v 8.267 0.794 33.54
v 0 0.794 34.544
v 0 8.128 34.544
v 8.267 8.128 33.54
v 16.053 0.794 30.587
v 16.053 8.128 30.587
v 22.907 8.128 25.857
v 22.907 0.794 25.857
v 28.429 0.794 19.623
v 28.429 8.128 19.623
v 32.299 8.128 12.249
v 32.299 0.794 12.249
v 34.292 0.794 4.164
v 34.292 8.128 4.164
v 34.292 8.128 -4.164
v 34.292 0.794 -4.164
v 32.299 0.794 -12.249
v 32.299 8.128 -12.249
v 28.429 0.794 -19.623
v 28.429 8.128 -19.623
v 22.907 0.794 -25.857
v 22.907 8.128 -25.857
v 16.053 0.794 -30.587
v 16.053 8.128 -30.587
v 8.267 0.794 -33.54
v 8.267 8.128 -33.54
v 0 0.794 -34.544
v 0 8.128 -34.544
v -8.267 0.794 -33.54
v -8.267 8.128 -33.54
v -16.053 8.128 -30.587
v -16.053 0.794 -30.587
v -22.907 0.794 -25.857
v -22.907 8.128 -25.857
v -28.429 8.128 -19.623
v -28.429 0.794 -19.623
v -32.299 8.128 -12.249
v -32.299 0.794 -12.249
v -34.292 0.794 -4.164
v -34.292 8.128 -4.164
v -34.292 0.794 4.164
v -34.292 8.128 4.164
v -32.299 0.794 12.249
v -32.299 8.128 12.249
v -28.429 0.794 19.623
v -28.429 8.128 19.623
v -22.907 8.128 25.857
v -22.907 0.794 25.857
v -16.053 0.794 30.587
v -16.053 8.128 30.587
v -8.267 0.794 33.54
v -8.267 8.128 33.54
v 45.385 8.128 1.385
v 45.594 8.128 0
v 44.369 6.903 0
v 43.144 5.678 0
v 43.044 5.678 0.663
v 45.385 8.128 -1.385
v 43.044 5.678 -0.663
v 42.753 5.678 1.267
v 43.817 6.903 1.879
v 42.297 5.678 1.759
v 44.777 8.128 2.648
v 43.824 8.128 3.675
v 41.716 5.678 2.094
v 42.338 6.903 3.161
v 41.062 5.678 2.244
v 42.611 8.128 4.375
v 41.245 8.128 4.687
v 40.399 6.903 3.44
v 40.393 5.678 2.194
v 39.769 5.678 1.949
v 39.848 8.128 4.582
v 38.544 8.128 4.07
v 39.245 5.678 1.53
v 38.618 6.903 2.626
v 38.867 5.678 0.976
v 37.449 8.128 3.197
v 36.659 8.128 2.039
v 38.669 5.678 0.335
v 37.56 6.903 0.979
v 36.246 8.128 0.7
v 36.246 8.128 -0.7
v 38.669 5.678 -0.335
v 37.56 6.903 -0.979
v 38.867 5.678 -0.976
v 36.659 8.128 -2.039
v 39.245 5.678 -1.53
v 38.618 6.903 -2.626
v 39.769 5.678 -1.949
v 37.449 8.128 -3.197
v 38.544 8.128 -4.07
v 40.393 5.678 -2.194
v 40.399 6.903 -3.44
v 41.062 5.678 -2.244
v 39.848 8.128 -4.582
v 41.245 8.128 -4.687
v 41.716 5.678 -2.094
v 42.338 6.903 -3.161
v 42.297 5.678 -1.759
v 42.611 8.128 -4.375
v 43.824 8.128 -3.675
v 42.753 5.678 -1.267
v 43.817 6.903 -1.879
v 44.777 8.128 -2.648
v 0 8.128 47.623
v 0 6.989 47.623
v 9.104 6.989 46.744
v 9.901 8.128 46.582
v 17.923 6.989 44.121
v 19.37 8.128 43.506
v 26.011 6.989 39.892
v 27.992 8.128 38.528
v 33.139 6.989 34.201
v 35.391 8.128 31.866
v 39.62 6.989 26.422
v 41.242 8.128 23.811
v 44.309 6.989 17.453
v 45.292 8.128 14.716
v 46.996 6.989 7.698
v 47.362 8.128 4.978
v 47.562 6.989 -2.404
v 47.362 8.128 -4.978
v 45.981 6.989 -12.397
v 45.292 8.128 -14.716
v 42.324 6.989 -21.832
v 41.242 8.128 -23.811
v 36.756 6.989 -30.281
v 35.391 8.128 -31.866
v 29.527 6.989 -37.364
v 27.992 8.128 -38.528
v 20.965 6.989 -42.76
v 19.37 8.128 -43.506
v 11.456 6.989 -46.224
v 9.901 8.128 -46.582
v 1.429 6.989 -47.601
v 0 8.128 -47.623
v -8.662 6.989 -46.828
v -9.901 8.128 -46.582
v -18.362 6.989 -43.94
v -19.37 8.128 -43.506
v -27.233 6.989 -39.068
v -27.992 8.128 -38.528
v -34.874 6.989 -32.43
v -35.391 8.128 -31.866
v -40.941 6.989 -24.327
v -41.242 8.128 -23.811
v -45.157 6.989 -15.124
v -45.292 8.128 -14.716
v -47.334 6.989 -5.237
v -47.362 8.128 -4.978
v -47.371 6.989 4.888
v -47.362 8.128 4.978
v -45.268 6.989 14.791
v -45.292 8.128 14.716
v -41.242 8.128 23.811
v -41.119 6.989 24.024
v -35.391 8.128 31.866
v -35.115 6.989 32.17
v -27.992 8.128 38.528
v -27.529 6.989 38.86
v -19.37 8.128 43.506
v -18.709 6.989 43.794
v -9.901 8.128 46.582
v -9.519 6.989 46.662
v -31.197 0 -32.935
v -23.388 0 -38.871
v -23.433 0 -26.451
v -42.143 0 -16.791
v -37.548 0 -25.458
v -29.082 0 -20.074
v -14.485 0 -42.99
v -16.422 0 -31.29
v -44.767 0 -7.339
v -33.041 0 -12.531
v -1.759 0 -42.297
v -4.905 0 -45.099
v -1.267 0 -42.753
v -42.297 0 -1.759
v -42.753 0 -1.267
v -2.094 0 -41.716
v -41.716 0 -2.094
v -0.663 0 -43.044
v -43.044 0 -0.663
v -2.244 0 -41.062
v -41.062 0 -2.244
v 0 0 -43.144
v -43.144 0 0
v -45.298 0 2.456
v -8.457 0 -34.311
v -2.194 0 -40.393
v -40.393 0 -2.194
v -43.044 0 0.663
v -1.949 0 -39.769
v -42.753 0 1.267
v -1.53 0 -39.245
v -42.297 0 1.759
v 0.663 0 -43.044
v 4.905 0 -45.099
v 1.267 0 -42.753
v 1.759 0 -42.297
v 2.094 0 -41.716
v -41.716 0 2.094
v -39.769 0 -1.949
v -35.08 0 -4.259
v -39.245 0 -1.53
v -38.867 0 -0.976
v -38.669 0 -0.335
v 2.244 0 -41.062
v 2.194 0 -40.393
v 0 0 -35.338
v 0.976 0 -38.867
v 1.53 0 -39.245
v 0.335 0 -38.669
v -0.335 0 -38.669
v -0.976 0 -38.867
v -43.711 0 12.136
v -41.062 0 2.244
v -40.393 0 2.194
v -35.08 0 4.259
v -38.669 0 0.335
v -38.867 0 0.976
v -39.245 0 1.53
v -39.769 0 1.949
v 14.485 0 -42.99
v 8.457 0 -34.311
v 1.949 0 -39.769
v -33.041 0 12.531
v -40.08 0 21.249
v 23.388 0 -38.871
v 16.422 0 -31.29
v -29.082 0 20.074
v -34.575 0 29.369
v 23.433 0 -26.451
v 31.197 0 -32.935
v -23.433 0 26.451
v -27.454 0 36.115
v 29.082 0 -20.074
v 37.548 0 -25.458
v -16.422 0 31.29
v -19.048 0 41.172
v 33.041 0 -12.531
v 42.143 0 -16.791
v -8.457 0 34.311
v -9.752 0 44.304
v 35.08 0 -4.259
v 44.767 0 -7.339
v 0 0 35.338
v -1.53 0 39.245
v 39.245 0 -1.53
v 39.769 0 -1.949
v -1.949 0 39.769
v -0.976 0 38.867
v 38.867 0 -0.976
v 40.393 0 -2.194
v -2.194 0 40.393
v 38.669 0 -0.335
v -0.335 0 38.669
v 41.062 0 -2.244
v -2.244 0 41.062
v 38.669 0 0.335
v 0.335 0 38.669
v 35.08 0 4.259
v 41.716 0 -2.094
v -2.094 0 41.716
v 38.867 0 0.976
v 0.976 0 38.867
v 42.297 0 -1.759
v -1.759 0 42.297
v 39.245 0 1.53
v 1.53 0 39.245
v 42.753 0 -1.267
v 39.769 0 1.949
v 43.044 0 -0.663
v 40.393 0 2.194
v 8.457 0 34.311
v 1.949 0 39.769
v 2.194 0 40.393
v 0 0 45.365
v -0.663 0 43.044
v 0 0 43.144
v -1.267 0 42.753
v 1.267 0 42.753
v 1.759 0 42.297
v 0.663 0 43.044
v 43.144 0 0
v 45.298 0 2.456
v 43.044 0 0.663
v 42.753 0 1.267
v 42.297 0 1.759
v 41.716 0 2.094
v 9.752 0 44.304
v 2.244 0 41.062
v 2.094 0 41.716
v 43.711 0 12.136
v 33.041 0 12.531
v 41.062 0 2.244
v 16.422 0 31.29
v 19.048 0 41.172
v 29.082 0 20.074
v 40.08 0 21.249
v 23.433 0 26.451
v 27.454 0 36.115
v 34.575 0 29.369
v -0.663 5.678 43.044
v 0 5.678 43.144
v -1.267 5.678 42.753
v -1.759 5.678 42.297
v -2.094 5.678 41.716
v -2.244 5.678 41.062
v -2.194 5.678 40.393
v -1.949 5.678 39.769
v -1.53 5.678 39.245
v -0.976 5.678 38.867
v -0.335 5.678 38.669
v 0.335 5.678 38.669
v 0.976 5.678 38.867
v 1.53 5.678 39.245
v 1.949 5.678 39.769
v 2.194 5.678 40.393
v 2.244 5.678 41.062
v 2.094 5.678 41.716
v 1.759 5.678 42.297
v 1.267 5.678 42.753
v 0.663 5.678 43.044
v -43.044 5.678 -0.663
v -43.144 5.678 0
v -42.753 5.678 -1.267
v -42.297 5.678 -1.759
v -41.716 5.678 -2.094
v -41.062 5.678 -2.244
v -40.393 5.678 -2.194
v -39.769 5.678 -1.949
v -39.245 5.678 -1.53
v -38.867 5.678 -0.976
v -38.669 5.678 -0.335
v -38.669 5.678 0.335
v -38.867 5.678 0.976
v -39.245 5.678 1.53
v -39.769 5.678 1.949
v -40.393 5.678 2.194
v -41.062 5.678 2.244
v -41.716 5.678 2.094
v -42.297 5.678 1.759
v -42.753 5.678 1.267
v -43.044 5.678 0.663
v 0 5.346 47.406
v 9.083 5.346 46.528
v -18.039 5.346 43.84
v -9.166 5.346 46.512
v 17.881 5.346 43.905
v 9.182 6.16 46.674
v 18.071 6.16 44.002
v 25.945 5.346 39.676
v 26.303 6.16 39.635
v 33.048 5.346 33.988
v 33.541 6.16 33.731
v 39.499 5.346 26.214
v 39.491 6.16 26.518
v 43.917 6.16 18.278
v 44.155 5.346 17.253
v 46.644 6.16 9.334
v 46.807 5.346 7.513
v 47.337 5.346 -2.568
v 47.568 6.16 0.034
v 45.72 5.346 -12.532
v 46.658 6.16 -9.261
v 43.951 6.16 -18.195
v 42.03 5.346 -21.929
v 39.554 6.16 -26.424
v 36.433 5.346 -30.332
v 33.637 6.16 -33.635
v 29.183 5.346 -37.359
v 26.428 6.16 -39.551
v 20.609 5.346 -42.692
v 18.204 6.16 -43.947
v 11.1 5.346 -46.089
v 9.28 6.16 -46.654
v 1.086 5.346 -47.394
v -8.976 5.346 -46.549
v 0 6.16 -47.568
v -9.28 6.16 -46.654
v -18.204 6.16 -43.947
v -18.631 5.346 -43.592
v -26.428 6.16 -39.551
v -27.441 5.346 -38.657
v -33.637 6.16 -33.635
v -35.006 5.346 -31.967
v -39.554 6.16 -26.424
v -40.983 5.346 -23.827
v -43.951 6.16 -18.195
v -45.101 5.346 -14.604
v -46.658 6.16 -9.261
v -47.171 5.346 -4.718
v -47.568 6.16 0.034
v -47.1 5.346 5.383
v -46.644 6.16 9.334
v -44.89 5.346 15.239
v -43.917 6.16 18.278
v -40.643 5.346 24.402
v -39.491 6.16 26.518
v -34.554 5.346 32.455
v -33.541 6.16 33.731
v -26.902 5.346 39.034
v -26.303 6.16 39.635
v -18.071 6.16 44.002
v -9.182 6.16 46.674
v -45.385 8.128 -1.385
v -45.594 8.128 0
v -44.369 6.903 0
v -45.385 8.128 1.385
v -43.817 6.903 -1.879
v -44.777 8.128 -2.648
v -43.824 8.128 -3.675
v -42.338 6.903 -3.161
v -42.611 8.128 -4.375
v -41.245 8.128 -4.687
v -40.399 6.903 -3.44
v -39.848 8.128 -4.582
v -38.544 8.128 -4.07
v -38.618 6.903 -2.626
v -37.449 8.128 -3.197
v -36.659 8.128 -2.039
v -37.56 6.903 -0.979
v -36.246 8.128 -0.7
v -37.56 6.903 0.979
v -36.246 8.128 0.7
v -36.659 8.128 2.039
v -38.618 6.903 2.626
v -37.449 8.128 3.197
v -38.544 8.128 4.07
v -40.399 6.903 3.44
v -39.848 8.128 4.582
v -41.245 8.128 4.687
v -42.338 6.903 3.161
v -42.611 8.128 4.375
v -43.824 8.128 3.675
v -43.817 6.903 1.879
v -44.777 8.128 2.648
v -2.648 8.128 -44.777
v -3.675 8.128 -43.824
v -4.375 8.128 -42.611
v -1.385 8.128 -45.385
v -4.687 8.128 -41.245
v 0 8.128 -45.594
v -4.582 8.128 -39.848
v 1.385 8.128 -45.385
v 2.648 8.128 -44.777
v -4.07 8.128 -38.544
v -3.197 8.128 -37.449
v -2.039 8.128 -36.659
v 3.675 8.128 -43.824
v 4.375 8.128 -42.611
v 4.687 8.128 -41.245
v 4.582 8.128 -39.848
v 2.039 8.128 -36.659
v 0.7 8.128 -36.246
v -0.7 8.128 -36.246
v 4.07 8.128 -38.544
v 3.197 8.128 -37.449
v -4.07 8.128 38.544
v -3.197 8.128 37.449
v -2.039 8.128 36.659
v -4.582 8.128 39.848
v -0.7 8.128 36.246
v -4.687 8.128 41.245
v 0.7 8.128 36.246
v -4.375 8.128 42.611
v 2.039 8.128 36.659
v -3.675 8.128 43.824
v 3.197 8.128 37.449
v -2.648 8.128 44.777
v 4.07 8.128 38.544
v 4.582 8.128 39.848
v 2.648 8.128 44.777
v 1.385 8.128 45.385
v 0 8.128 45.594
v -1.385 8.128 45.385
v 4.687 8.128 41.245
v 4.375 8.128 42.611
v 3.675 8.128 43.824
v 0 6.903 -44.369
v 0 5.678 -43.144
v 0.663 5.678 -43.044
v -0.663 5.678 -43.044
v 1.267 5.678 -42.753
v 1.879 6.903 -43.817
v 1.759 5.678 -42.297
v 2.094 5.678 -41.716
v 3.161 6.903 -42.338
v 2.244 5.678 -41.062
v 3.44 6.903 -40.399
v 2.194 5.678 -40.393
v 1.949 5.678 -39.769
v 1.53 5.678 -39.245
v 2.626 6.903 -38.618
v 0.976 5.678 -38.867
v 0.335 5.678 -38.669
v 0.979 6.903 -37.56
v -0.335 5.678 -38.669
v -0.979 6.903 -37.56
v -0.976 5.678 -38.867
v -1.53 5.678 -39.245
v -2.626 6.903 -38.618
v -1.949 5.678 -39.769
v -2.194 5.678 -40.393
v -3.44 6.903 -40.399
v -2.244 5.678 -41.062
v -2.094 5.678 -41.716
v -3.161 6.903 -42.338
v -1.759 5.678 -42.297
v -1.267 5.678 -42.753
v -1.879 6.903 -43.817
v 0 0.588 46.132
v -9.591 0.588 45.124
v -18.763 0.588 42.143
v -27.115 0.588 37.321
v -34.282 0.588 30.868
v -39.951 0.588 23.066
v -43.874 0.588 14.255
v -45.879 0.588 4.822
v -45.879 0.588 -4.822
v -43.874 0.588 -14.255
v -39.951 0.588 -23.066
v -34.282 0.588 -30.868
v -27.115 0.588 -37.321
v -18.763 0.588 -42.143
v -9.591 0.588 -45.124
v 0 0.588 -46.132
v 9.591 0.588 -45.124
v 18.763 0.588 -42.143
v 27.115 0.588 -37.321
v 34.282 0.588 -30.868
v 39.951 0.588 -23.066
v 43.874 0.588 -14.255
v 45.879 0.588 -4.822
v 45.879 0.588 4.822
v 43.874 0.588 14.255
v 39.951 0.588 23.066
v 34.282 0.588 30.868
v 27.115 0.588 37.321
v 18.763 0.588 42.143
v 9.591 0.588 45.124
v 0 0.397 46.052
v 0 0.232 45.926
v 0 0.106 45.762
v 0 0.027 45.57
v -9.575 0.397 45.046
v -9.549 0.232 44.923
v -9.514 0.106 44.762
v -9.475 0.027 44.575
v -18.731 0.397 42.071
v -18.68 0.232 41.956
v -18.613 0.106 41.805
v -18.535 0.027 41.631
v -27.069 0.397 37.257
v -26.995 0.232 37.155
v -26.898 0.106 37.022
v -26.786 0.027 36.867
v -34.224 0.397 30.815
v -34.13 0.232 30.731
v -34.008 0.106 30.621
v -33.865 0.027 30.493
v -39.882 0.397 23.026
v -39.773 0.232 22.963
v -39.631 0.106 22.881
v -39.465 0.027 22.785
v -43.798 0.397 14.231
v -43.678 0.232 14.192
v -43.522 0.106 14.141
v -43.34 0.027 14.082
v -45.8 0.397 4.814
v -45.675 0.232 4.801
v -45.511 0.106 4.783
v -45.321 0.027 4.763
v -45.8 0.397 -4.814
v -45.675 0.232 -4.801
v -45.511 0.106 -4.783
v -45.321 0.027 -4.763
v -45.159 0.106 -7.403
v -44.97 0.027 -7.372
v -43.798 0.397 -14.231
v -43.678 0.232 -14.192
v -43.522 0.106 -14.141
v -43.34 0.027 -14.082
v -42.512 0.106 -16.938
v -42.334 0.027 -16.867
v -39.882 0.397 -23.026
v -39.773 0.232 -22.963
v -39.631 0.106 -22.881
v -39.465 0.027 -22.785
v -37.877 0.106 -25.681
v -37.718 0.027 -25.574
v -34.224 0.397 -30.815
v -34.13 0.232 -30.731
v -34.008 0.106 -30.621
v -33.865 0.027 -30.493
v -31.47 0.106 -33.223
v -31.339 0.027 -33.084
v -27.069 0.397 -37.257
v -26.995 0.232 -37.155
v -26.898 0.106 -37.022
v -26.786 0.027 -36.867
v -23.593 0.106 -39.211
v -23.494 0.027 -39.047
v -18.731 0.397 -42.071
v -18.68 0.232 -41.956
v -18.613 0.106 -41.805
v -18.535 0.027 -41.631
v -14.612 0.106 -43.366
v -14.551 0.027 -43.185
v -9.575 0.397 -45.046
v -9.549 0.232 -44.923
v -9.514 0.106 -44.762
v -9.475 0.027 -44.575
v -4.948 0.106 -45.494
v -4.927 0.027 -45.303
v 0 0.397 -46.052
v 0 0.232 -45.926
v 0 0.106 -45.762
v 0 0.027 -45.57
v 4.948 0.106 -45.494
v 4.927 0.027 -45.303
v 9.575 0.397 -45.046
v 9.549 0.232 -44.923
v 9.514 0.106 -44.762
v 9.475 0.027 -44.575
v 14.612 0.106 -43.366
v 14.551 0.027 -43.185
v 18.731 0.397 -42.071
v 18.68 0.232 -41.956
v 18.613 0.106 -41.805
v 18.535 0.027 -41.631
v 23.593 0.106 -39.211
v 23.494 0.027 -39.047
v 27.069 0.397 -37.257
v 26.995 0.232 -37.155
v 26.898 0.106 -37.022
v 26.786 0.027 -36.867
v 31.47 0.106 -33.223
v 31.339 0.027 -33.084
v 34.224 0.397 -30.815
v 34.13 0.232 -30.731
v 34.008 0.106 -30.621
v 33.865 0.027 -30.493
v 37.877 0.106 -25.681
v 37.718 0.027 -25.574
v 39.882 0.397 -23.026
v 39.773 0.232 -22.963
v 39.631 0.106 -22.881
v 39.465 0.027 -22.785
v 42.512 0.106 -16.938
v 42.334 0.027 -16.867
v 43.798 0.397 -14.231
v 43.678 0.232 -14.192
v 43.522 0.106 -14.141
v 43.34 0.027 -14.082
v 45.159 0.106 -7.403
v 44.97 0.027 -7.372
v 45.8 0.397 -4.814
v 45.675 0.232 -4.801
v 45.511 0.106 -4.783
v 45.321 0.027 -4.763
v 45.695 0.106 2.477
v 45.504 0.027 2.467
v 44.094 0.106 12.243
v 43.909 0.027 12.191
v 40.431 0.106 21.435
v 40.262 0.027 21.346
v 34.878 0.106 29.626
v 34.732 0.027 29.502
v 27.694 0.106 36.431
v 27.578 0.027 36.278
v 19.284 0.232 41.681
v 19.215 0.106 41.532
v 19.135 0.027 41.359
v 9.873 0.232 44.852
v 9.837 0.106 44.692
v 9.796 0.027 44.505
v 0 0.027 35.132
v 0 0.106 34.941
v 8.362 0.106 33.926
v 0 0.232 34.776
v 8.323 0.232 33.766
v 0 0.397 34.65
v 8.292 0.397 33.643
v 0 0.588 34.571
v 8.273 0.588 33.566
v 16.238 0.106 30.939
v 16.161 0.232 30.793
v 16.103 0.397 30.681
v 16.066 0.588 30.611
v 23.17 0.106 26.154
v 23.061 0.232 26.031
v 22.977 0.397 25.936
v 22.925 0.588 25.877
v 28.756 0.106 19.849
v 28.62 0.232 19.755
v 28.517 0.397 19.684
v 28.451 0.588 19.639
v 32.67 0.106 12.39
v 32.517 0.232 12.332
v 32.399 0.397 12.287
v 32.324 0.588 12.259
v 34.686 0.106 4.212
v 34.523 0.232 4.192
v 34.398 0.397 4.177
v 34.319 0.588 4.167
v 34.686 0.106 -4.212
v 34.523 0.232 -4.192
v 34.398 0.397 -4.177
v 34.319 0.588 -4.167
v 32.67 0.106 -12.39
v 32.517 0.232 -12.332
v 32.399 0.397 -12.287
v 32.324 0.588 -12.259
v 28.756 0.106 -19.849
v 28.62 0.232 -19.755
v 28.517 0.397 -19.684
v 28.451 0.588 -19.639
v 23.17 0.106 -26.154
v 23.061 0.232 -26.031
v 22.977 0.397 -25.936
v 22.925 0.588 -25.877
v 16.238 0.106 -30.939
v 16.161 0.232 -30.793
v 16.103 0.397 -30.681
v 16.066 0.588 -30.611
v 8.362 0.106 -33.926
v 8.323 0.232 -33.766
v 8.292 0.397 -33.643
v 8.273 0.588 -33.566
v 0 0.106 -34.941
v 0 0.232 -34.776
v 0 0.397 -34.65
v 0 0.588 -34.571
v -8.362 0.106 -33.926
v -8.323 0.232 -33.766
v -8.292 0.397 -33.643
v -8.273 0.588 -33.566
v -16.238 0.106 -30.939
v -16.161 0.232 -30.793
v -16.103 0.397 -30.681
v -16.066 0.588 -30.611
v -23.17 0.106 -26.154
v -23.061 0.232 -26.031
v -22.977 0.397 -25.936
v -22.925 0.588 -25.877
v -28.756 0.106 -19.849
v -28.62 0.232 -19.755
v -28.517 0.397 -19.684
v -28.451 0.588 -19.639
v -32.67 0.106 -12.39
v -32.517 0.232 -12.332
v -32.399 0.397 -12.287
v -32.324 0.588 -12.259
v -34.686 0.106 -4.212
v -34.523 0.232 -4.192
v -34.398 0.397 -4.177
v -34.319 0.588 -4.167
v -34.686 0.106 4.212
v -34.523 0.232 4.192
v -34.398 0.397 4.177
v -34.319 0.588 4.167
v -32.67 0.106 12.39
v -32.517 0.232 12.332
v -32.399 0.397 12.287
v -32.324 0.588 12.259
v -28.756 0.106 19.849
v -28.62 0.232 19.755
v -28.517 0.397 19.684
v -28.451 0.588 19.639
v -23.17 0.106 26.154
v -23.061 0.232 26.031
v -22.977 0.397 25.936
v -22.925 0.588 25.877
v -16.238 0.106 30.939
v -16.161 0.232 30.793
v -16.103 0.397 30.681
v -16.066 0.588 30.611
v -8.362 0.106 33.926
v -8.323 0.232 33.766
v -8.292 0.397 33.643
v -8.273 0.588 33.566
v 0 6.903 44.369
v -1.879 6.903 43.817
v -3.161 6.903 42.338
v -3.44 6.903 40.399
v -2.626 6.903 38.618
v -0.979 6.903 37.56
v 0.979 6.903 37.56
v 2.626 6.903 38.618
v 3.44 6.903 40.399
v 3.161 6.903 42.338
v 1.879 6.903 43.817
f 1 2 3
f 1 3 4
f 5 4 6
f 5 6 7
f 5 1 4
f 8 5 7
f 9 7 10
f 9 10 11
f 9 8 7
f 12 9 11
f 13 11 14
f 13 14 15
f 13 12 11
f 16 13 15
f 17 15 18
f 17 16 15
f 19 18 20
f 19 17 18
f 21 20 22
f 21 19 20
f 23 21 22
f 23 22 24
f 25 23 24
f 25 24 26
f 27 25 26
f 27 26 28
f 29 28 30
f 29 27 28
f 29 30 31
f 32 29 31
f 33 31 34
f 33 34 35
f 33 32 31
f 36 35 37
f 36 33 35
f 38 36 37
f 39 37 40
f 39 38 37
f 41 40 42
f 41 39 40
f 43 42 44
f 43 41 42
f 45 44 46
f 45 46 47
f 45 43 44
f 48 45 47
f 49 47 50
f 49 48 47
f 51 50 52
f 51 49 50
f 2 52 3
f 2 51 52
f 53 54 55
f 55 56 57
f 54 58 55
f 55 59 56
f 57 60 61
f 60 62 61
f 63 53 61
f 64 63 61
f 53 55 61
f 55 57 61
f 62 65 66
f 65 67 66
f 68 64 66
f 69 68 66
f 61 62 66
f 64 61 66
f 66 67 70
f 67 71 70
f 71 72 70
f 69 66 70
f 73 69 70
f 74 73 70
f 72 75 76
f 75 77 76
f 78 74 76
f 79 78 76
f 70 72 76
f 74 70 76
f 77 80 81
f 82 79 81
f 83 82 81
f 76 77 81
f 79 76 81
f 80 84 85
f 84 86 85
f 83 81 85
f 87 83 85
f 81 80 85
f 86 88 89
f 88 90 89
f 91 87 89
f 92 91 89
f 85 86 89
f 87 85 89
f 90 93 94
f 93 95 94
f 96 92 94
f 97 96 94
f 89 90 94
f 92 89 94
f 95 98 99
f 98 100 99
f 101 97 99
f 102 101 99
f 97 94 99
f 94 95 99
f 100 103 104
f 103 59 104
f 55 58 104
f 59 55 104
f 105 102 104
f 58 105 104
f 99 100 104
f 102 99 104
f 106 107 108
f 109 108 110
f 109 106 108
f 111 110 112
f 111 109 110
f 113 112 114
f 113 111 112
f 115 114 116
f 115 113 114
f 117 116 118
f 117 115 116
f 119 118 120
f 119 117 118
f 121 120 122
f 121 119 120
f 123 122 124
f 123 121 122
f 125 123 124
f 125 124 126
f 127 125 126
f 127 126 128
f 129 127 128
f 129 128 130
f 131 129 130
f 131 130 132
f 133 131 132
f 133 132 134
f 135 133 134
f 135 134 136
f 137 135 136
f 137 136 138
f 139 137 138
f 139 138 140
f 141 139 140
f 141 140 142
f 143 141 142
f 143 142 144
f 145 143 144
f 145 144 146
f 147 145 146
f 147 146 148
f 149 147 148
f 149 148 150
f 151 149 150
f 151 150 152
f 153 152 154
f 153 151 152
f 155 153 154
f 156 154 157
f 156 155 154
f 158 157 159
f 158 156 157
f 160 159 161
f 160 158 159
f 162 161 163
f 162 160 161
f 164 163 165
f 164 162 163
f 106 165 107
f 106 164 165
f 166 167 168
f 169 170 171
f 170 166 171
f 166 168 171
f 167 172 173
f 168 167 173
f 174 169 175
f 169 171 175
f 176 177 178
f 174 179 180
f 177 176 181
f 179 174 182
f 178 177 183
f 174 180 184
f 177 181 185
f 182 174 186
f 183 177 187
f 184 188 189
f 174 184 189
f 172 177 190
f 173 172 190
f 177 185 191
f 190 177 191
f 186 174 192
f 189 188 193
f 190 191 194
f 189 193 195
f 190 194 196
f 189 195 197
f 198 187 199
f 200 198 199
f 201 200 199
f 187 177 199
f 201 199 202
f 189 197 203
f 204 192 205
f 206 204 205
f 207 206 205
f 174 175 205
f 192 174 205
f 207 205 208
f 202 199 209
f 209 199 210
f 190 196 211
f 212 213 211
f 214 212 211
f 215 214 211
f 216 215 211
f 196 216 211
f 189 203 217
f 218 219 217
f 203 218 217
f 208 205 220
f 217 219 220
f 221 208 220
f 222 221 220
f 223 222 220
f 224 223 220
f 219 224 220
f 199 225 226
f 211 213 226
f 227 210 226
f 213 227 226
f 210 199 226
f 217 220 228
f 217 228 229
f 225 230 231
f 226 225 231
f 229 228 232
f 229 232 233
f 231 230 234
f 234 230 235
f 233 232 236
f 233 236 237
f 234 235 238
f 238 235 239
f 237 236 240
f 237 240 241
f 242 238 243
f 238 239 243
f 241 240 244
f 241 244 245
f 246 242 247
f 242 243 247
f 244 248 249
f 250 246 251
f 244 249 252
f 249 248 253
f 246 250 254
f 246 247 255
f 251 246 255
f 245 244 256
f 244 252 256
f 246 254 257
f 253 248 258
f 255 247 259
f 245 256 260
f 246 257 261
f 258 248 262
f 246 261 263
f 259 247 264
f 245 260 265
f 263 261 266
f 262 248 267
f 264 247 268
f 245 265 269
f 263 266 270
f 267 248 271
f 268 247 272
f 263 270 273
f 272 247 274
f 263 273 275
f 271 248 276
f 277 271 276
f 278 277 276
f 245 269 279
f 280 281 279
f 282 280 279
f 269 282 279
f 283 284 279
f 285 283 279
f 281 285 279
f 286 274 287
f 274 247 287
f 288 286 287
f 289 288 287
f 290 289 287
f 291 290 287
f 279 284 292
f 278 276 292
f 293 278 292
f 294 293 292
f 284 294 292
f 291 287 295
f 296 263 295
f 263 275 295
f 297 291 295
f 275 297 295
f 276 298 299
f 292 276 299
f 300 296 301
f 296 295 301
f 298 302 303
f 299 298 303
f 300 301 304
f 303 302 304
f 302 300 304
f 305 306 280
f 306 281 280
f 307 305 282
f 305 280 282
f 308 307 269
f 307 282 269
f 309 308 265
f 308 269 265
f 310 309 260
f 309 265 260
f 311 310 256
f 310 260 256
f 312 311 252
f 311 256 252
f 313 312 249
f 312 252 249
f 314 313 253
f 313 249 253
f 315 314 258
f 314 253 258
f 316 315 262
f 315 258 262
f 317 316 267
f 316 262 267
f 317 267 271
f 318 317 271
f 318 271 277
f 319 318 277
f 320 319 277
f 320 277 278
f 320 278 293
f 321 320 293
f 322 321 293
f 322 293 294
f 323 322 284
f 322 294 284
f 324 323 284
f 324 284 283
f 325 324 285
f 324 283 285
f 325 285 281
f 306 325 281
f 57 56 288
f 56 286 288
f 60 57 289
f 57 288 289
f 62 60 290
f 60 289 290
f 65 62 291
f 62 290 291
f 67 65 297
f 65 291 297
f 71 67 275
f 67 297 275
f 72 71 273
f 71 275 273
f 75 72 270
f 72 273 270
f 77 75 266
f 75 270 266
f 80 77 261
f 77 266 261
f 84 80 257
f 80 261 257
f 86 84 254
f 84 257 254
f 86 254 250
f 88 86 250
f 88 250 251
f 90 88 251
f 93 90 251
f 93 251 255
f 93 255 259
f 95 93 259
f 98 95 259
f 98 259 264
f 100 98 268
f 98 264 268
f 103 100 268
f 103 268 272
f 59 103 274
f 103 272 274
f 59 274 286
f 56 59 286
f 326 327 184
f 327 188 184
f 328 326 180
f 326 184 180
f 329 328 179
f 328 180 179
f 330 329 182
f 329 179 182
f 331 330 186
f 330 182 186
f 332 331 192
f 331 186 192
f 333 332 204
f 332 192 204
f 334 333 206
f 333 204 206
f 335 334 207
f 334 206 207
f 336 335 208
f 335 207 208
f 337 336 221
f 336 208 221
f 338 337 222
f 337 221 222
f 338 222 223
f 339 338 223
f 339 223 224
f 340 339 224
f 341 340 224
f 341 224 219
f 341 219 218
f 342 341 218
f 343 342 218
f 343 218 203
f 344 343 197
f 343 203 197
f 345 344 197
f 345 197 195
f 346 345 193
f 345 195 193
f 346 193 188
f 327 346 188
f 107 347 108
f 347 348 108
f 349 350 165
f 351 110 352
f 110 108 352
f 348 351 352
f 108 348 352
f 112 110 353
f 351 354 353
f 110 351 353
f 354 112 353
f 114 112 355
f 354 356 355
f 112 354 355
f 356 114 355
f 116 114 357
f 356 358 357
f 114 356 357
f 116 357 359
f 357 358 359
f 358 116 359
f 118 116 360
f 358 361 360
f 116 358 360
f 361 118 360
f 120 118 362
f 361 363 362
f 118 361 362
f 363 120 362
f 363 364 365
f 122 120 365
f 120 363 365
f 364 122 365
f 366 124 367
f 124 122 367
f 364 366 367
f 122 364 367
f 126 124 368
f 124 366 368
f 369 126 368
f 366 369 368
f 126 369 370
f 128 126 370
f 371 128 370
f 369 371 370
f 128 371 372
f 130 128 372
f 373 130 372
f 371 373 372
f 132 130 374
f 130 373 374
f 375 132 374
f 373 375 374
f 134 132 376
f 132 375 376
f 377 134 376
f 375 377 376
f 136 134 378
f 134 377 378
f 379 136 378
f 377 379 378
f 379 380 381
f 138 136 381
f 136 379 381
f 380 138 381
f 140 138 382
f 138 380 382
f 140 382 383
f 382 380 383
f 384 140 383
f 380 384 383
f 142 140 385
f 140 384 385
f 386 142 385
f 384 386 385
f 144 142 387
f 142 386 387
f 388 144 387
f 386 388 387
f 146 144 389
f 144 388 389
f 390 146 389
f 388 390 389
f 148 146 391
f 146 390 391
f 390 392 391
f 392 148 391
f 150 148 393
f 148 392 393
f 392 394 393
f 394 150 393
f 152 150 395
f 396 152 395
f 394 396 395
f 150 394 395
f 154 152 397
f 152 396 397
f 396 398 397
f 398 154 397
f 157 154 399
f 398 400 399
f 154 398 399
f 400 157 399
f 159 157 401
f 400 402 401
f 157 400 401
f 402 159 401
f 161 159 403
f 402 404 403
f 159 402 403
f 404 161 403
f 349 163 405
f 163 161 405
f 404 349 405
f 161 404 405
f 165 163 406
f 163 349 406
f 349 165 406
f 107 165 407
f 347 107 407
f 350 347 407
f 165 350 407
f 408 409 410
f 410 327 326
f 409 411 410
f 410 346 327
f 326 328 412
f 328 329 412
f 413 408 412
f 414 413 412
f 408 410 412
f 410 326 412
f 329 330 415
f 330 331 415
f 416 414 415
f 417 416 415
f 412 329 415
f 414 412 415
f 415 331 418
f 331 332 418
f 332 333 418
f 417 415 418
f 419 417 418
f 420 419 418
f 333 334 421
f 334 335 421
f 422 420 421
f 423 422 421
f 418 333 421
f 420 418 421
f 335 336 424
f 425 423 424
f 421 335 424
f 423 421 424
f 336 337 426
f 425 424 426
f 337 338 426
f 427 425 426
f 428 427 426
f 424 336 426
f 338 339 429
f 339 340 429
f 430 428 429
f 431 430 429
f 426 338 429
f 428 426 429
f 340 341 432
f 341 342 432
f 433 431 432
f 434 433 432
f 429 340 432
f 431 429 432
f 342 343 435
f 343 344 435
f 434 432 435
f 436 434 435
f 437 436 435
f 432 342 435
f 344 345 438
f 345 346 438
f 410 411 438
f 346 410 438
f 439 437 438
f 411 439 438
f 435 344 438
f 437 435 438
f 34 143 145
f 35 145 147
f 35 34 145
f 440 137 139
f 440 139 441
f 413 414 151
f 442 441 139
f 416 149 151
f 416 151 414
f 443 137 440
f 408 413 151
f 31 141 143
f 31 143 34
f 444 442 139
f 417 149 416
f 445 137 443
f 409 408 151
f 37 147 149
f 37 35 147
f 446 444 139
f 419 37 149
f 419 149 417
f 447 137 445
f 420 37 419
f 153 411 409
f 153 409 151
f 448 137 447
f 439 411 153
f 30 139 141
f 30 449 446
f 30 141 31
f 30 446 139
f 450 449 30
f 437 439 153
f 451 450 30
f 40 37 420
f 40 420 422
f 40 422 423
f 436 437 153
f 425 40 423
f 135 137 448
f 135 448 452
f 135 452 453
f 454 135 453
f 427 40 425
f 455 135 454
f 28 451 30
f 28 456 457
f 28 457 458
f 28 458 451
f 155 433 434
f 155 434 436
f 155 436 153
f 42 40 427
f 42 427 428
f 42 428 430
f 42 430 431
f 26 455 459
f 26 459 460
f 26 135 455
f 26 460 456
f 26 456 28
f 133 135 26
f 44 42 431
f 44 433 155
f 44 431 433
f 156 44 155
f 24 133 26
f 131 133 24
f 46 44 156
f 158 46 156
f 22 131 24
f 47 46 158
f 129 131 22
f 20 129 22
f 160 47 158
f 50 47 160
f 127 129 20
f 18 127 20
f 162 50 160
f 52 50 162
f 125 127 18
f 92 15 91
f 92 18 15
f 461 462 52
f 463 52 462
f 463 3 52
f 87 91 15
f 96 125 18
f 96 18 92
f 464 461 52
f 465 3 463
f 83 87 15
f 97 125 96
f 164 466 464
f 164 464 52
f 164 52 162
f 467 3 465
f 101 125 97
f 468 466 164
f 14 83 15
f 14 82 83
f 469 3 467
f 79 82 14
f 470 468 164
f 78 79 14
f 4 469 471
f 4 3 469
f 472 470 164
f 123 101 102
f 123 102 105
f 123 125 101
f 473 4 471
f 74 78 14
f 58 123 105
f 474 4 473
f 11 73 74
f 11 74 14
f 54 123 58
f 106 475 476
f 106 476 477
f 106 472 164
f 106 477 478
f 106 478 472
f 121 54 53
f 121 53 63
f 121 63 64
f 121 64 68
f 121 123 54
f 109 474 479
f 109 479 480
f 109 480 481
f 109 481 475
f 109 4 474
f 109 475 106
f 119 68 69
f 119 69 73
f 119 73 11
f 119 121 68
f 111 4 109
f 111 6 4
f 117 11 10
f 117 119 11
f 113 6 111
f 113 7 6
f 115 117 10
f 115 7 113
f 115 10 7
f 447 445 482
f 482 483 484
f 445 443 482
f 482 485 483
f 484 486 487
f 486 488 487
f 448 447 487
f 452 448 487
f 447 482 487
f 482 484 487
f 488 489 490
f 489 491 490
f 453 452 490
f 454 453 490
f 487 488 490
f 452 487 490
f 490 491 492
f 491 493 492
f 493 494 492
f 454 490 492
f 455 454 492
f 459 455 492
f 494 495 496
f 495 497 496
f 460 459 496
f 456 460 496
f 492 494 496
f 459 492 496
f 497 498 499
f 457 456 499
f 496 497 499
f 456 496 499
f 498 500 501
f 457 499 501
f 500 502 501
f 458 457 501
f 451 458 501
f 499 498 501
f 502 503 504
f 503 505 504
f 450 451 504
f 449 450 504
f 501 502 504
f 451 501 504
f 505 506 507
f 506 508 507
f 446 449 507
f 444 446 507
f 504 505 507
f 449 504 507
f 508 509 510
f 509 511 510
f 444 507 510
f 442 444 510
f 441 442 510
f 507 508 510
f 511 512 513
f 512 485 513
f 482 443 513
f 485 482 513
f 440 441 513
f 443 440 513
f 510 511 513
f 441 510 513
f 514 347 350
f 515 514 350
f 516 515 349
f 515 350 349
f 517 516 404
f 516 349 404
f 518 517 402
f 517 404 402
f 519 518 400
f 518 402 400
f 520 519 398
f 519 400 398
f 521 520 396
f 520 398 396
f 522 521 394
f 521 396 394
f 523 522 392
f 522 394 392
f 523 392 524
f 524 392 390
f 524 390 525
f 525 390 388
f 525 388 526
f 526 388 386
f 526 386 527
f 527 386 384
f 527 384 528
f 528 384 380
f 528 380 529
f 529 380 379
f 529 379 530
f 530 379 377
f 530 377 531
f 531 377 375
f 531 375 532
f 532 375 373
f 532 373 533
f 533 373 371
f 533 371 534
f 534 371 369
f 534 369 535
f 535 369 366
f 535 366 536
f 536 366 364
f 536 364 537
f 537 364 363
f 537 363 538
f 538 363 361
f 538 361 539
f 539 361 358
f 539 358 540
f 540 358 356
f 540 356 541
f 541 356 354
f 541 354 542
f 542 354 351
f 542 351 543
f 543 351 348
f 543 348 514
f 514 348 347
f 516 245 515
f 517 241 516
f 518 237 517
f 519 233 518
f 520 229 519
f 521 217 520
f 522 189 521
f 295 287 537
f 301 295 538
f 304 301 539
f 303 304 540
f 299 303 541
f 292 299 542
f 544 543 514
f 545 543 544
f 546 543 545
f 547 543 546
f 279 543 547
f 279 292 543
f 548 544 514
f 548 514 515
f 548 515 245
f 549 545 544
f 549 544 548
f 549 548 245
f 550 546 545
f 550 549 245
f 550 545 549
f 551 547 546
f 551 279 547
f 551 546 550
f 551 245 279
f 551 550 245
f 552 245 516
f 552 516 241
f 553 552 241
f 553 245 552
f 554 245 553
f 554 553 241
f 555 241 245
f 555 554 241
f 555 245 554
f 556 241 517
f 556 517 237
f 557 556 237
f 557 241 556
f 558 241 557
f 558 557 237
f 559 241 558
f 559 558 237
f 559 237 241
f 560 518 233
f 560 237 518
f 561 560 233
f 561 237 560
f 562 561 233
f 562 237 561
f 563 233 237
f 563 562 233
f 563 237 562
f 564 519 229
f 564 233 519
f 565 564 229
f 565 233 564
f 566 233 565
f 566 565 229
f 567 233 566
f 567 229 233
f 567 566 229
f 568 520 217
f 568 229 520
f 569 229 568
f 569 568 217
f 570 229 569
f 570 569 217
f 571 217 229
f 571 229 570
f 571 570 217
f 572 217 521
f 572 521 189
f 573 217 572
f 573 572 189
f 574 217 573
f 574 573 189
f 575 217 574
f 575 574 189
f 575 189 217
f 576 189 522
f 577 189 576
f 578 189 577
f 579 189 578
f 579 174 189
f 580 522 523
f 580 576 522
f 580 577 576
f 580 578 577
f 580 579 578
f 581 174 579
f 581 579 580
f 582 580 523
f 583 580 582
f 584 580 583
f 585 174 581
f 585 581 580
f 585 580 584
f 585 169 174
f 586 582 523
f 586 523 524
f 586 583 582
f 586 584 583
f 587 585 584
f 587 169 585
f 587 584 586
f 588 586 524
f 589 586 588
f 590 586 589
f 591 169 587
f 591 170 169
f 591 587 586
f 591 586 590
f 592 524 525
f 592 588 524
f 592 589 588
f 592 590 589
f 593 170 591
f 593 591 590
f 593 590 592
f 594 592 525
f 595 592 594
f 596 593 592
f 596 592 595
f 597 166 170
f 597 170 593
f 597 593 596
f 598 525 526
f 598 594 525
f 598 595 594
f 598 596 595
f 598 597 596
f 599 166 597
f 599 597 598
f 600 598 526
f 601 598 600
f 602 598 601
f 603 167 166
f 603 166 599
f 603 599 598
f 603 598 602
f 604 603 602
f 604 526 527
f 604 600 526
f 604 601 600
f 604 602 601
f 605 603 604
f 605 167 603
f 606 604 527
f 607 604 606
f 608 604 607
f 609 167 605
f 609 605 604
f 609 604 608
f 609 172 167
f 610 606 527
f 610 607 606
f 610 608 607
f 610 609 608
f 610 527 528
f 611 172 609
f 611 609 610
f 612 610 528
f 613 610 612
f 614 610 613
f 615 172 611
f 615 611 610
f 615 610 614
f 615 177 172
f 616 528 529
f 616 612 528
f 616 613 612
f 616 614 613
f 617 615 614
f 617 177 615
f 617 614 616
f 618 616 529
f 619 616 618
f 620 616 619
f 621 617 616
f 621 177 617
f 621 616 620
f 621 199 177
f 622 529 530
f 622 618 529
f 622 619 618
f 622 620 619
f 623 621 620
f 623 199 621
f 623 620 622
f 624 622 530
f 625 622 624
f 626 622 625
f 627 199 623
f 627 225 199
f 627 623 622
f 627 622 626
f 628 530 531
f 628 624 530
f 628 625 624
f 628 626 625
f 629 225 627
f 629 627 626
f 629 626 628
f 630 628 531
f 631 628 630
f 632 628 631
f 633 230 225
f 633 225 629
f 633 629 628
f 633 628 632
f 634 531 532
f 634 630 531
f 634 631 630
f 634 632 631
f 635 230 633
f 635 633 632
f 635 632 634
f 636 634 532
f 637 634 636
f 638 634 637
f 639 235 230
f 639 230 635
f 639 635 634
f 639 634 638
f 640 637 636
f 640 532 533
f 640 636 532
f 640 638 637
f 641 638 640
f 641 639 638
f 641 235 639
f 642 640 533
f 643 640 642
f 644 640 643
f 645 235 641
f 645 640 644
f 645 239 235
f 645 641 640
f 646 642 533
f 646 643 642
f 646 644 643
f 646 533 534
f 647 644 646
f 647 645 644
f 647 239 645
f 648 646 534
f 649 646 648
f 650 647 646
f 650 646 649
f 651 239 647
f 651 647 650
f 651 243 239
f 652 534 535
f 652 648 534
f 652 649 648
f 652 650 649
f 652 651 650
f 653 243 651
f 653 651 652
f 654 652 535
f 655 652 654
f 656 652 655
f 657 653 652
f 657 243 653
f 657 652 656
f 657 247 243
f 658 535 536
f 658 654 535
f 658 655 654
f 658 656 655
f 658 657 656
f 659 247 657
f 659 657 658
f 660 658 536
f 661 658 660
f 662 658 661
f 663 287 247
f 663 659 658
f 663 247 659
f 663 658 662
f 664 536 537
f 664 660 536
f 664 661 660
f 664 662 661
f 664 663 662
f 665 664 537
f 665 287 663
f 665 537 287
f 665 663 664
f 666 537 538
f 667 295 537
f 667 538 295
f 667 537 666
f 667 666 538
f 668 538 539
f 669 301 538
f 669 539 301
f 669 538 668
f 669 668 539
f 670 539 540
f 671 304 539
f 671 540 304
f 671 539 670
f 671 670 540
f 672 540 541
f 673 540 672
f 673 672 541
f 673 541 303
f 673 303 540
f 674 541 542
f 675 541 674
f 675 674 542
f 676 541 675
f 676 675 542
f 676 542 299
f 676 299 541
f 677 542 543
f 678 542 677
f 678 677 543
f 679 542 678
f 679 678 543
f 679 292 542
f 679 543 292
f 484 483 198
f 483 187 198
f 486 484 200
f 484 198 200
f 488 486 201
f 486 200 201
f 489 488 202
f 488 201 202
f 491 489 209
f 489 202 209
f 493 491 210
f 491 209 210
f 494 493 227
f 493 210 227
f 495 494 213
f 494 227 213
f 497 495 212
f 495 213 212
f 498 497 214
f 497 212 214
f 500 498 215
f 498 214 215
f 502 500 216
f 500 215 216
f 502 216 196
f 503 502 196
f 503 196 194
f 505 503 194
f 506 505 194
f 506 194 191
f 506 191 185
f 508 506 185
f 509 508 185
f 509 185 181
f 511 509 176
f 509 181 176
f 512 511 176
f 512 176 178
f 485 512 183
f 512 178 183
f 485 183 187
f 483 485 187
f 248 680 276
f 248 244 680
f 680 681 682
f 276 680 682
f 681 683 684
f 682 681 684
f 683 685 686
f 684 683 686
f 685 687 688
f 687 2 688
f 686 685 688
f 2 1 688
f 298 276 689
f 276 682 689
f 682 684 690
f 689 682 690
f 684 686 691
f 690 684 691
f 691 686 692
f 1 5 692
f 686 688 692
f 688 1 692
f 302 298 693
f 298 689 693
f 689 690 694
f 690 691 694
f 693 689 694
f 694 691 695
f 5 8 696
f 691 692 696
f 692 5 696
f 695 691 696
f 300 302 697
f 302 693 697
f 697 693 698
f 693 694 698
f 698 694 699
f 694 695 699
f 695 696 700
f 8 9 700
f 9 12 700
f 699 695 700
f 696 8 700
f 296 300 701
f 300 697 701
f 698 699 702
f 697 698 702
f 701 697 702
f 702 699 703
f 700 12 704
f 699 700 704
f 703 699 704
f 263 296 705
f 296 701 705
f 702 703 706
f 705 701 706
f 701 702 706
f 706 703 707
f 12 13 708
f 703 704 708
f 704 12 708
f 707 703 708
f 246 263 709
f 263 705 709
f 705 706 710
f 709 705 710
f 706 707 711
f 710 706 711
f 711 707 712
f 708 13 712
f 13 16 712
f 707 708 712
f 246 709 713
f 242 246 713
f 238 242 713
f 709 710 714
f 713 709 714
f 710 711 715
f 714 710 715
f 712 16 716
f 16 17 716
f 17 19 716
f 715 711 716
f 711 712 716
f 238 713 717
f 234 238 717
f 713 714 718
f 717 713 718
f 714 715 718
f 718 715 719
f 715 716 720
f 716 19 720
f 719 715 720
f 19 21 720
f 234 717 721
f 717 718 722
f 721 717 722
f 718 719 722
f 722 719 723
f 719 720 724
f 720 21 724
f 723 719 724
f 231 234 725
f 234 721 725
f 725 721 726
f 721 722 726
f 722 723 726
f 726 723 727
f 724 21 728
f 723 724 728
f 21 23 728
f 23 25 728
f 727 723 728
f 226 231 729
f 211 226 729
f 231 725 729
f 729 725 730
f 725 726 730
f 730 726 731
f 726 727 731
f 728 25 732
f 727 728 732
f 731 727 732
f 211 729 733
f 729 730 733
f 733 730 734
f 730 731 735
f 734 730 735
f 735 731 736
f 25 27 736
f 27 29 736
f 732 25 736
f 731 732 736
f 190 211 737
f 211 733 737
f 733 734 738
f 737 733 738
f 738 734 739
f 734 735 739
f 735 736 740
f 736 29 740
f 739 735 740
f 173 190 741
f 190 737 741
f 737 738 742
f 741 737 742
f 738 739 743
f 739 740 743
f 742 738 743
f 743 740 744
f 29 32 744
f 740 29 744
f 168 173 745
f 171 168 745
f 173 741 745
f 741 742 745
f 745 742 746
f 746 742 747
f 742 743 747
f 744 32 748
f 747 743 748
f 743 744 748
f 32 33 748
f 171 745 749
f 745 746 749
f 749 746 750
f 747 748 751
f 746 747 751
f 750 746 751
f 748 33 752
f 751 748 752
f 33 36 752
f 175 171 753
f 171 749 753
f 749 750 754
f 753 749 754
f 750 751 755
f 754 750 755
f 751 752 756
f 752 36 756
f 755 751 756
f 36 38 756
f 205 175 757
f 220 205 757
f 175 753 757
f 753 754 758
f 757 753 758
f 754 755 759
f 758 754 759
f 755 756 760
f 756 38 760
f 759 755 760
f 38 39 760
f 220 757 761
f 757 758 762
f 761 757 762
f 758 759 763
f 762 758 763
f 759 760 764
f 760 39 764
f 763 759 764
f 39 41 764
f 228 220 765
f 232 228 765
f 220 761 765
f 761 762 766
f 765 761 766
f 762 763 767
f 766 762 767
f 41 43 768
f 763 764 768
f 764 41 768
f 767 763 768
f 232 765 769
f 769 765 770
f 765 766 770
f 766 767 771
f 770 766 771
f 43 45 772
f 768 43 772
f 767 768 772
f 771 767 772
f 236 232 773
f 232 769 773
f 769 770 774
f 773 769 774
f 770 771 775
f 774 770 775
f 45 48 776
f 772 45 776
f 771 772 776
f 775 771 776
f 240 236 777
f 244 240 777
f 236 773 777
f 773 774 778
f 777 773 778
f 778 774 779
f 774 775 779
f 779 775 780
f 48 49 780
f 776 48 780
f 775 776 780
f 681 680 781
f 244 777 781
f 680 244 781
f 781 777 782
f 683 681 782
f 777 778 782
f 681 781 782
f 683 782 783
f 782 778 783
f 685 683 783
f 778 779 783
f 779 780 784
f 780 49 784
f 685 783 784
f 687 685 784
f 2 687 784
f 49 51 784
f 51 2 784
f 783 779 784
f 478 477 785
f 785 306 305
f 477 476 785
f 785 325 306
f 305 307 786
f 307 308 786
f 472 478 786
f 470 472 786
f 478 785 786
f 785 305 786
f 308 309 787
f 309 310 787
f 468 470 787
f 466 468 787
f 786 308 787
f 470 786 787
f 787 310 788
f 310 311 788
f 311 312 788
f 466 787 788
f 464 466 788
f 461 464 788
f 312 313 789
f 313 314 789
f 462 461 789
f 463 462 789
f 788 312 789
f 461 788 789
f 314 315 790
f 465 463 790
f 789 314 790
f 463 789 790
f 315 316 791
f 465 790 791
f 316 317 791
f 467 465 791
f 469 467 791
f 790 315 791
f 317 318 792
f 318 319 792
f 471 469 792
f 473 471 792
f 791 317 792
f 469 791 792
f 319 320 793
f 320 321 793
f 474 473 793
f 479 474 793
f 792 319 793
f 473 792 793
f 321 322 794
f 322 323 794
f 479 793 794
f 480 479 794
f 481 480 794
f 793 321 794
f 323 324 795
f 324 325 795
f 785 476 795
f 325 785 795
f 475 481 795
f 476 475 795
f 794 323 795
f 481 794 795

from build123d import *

# Parameters (mm, degrees)
SKETCH1_R                                       = 47.244
SKETCH1_R_2                                     = 34.544
BOSS_EXTRUDE1_DEPTH                             = 8.128
CSK_FOR_M4_FLAT_HEAD_MACHINE_SCREW1_D           = 4.5
CSK_FOR_M4_FLAT_HEAD_MACHINE_SCREW1_CSINK_D     = 9.4
CSK_FOR_M4_FLAT_HEAD_MACHINE_SCREW1_CSINK_ANGLE = 90
CIRPATTERN1_COUNT                               = 4
DRAFT2_ANGLE                                    = 15
SKETCH6_OUTSIDE_W                               = 125.592
SKETCH6_OUTSIDE_H                               = 125.592
SKETCH6_OUTSIDE_R                               = 47.622724369
CUT_EXTRUDE1_DEPTH                              = 69.580417064
FILLET1_R                                       = 6.35
FILLET2_R                                       = 0.79375


with BuildPart() as part:
    # Sketch1 → Boss-Extrude1 (new body)
    with BuildSketch(Plane(origin=(0, 0, 0), x_dir=(1, 0, 0), z_dir=(0, 1, 0))):
        with Locations(Location((0, 0, 0), (0, 0, 270))):
            Circle(SKETCH1_R)
        with Locations(Location((0, 0, 0), (0, 0, 270))):
            Circle(SKETCH1_R_2, mode=Mode.SUBTRACT)
    extrude(amount=BOSS_EXTRUDE1_DEPTH)

    # CSK for M4 Flat Head Machine Screw1 (through all)
    with Locations(Plane(origin=(0, 8.128, -40.894), x_dir=(0, 0, 1), z_dir=(0, 1, 0))):
        with Locations((0, 0)):
            csk_for_m4_flat_head_machine_screw1 = CounterSinkHole(CSK_FOR_M4_FLAT_HEAD_MACHINE_SCREW1_D / 2, CSK_FOR_M4_FLAT_HEAD_MACHINE_SCREW1_CSINK_D / 2, counter_sink_angle=CSK_FOR_M4_FLAT_HEAD_MACHINE_SCREW1_CSINK_ANGLE)

    # CirPattern1: CSK for M4 Flat Head Machine Screw1 ×4 about axis
    cirpattern1_axis = Axis((0, 0, 0), (0, 1, 0))
    for i in range(1, CIRPATTERN1_COUNT):
        add(csk_for_m4_flat_head_machine_screw1.rotate(cirpattern1_axis, i * 360 / CIRPATTERN1_COUNT), mode=Mode.SUBTRACT)

    # Draft2
    draft2_faces = [part.faces().sort_by_distance(p)[0] for p in [
        (0, 4.064, -47.244),
    ]]
    draft(draft2_faces, Plane(origin=(0, 0, 0), x_dir=(0, 0, -1), z_dir=(0, -1, 0)), DRAFT2_ANGLE)

    # Sketch5 → Cut-Revolve1 (revolve, cut)
    with BuildSketch(Plane(origin=(0, 0, 0), x_dir=(0, 0, -1), z_dir=(1, 0, 0)), mode=Mode.PRIVATE) as cut_revolve1_sk:
        Polygon((48.151891036, 8.128), (49.421891036, 8.128), (47.244, 0), (45.974, 0), align=None)
    revolve(cut_revolve1_sk.sketch.rotate(Axis((0, 8.128, 0), (0, -1, 0)), 180), axis=Axis((0, 8.128, 0), (0, -1, 0)), mode=Mode.SUBTRACT)

    # Sketch6 outside → Cut-Extrude1 (cut, through all)
    with BuildSketch(Plane(origin=(0, 8.128, 0), x_dir=(1, 0, 0), z_dir=(0, 1, 0))):
        Rectangle(SKETCH6_OUTSIDE_W, SKETCH6_OUTSIDE_H)
        with Locations(Location((0, 0, 0), (0, 0, 270))):
            Circle(SKETCH6_OUTSIDE_R, mode=Mode.SUBTRACT)
    extrude(amount=-CUT_EXTRUDE1_DEPTH, mode=Mode.SUBTRACT)

    # Fillet1
    fillet1_edges = [part.edges().sort_by_distance(p)[0] for p in [
        (0, 6.153123114, -47.622724369),
    ]]
    fillet(fillet1_edges, radius=FILLET1_R)

    # Fillet2
    fillet2_edges = [part.edges().sort_by_distance(p)[0] for p in [
        (0, 0, -45.974),
        (0, 0, -34.544),
    ]]
    fillet(fillet2_edges, radius=FILLET2_R)


solid = part.part
